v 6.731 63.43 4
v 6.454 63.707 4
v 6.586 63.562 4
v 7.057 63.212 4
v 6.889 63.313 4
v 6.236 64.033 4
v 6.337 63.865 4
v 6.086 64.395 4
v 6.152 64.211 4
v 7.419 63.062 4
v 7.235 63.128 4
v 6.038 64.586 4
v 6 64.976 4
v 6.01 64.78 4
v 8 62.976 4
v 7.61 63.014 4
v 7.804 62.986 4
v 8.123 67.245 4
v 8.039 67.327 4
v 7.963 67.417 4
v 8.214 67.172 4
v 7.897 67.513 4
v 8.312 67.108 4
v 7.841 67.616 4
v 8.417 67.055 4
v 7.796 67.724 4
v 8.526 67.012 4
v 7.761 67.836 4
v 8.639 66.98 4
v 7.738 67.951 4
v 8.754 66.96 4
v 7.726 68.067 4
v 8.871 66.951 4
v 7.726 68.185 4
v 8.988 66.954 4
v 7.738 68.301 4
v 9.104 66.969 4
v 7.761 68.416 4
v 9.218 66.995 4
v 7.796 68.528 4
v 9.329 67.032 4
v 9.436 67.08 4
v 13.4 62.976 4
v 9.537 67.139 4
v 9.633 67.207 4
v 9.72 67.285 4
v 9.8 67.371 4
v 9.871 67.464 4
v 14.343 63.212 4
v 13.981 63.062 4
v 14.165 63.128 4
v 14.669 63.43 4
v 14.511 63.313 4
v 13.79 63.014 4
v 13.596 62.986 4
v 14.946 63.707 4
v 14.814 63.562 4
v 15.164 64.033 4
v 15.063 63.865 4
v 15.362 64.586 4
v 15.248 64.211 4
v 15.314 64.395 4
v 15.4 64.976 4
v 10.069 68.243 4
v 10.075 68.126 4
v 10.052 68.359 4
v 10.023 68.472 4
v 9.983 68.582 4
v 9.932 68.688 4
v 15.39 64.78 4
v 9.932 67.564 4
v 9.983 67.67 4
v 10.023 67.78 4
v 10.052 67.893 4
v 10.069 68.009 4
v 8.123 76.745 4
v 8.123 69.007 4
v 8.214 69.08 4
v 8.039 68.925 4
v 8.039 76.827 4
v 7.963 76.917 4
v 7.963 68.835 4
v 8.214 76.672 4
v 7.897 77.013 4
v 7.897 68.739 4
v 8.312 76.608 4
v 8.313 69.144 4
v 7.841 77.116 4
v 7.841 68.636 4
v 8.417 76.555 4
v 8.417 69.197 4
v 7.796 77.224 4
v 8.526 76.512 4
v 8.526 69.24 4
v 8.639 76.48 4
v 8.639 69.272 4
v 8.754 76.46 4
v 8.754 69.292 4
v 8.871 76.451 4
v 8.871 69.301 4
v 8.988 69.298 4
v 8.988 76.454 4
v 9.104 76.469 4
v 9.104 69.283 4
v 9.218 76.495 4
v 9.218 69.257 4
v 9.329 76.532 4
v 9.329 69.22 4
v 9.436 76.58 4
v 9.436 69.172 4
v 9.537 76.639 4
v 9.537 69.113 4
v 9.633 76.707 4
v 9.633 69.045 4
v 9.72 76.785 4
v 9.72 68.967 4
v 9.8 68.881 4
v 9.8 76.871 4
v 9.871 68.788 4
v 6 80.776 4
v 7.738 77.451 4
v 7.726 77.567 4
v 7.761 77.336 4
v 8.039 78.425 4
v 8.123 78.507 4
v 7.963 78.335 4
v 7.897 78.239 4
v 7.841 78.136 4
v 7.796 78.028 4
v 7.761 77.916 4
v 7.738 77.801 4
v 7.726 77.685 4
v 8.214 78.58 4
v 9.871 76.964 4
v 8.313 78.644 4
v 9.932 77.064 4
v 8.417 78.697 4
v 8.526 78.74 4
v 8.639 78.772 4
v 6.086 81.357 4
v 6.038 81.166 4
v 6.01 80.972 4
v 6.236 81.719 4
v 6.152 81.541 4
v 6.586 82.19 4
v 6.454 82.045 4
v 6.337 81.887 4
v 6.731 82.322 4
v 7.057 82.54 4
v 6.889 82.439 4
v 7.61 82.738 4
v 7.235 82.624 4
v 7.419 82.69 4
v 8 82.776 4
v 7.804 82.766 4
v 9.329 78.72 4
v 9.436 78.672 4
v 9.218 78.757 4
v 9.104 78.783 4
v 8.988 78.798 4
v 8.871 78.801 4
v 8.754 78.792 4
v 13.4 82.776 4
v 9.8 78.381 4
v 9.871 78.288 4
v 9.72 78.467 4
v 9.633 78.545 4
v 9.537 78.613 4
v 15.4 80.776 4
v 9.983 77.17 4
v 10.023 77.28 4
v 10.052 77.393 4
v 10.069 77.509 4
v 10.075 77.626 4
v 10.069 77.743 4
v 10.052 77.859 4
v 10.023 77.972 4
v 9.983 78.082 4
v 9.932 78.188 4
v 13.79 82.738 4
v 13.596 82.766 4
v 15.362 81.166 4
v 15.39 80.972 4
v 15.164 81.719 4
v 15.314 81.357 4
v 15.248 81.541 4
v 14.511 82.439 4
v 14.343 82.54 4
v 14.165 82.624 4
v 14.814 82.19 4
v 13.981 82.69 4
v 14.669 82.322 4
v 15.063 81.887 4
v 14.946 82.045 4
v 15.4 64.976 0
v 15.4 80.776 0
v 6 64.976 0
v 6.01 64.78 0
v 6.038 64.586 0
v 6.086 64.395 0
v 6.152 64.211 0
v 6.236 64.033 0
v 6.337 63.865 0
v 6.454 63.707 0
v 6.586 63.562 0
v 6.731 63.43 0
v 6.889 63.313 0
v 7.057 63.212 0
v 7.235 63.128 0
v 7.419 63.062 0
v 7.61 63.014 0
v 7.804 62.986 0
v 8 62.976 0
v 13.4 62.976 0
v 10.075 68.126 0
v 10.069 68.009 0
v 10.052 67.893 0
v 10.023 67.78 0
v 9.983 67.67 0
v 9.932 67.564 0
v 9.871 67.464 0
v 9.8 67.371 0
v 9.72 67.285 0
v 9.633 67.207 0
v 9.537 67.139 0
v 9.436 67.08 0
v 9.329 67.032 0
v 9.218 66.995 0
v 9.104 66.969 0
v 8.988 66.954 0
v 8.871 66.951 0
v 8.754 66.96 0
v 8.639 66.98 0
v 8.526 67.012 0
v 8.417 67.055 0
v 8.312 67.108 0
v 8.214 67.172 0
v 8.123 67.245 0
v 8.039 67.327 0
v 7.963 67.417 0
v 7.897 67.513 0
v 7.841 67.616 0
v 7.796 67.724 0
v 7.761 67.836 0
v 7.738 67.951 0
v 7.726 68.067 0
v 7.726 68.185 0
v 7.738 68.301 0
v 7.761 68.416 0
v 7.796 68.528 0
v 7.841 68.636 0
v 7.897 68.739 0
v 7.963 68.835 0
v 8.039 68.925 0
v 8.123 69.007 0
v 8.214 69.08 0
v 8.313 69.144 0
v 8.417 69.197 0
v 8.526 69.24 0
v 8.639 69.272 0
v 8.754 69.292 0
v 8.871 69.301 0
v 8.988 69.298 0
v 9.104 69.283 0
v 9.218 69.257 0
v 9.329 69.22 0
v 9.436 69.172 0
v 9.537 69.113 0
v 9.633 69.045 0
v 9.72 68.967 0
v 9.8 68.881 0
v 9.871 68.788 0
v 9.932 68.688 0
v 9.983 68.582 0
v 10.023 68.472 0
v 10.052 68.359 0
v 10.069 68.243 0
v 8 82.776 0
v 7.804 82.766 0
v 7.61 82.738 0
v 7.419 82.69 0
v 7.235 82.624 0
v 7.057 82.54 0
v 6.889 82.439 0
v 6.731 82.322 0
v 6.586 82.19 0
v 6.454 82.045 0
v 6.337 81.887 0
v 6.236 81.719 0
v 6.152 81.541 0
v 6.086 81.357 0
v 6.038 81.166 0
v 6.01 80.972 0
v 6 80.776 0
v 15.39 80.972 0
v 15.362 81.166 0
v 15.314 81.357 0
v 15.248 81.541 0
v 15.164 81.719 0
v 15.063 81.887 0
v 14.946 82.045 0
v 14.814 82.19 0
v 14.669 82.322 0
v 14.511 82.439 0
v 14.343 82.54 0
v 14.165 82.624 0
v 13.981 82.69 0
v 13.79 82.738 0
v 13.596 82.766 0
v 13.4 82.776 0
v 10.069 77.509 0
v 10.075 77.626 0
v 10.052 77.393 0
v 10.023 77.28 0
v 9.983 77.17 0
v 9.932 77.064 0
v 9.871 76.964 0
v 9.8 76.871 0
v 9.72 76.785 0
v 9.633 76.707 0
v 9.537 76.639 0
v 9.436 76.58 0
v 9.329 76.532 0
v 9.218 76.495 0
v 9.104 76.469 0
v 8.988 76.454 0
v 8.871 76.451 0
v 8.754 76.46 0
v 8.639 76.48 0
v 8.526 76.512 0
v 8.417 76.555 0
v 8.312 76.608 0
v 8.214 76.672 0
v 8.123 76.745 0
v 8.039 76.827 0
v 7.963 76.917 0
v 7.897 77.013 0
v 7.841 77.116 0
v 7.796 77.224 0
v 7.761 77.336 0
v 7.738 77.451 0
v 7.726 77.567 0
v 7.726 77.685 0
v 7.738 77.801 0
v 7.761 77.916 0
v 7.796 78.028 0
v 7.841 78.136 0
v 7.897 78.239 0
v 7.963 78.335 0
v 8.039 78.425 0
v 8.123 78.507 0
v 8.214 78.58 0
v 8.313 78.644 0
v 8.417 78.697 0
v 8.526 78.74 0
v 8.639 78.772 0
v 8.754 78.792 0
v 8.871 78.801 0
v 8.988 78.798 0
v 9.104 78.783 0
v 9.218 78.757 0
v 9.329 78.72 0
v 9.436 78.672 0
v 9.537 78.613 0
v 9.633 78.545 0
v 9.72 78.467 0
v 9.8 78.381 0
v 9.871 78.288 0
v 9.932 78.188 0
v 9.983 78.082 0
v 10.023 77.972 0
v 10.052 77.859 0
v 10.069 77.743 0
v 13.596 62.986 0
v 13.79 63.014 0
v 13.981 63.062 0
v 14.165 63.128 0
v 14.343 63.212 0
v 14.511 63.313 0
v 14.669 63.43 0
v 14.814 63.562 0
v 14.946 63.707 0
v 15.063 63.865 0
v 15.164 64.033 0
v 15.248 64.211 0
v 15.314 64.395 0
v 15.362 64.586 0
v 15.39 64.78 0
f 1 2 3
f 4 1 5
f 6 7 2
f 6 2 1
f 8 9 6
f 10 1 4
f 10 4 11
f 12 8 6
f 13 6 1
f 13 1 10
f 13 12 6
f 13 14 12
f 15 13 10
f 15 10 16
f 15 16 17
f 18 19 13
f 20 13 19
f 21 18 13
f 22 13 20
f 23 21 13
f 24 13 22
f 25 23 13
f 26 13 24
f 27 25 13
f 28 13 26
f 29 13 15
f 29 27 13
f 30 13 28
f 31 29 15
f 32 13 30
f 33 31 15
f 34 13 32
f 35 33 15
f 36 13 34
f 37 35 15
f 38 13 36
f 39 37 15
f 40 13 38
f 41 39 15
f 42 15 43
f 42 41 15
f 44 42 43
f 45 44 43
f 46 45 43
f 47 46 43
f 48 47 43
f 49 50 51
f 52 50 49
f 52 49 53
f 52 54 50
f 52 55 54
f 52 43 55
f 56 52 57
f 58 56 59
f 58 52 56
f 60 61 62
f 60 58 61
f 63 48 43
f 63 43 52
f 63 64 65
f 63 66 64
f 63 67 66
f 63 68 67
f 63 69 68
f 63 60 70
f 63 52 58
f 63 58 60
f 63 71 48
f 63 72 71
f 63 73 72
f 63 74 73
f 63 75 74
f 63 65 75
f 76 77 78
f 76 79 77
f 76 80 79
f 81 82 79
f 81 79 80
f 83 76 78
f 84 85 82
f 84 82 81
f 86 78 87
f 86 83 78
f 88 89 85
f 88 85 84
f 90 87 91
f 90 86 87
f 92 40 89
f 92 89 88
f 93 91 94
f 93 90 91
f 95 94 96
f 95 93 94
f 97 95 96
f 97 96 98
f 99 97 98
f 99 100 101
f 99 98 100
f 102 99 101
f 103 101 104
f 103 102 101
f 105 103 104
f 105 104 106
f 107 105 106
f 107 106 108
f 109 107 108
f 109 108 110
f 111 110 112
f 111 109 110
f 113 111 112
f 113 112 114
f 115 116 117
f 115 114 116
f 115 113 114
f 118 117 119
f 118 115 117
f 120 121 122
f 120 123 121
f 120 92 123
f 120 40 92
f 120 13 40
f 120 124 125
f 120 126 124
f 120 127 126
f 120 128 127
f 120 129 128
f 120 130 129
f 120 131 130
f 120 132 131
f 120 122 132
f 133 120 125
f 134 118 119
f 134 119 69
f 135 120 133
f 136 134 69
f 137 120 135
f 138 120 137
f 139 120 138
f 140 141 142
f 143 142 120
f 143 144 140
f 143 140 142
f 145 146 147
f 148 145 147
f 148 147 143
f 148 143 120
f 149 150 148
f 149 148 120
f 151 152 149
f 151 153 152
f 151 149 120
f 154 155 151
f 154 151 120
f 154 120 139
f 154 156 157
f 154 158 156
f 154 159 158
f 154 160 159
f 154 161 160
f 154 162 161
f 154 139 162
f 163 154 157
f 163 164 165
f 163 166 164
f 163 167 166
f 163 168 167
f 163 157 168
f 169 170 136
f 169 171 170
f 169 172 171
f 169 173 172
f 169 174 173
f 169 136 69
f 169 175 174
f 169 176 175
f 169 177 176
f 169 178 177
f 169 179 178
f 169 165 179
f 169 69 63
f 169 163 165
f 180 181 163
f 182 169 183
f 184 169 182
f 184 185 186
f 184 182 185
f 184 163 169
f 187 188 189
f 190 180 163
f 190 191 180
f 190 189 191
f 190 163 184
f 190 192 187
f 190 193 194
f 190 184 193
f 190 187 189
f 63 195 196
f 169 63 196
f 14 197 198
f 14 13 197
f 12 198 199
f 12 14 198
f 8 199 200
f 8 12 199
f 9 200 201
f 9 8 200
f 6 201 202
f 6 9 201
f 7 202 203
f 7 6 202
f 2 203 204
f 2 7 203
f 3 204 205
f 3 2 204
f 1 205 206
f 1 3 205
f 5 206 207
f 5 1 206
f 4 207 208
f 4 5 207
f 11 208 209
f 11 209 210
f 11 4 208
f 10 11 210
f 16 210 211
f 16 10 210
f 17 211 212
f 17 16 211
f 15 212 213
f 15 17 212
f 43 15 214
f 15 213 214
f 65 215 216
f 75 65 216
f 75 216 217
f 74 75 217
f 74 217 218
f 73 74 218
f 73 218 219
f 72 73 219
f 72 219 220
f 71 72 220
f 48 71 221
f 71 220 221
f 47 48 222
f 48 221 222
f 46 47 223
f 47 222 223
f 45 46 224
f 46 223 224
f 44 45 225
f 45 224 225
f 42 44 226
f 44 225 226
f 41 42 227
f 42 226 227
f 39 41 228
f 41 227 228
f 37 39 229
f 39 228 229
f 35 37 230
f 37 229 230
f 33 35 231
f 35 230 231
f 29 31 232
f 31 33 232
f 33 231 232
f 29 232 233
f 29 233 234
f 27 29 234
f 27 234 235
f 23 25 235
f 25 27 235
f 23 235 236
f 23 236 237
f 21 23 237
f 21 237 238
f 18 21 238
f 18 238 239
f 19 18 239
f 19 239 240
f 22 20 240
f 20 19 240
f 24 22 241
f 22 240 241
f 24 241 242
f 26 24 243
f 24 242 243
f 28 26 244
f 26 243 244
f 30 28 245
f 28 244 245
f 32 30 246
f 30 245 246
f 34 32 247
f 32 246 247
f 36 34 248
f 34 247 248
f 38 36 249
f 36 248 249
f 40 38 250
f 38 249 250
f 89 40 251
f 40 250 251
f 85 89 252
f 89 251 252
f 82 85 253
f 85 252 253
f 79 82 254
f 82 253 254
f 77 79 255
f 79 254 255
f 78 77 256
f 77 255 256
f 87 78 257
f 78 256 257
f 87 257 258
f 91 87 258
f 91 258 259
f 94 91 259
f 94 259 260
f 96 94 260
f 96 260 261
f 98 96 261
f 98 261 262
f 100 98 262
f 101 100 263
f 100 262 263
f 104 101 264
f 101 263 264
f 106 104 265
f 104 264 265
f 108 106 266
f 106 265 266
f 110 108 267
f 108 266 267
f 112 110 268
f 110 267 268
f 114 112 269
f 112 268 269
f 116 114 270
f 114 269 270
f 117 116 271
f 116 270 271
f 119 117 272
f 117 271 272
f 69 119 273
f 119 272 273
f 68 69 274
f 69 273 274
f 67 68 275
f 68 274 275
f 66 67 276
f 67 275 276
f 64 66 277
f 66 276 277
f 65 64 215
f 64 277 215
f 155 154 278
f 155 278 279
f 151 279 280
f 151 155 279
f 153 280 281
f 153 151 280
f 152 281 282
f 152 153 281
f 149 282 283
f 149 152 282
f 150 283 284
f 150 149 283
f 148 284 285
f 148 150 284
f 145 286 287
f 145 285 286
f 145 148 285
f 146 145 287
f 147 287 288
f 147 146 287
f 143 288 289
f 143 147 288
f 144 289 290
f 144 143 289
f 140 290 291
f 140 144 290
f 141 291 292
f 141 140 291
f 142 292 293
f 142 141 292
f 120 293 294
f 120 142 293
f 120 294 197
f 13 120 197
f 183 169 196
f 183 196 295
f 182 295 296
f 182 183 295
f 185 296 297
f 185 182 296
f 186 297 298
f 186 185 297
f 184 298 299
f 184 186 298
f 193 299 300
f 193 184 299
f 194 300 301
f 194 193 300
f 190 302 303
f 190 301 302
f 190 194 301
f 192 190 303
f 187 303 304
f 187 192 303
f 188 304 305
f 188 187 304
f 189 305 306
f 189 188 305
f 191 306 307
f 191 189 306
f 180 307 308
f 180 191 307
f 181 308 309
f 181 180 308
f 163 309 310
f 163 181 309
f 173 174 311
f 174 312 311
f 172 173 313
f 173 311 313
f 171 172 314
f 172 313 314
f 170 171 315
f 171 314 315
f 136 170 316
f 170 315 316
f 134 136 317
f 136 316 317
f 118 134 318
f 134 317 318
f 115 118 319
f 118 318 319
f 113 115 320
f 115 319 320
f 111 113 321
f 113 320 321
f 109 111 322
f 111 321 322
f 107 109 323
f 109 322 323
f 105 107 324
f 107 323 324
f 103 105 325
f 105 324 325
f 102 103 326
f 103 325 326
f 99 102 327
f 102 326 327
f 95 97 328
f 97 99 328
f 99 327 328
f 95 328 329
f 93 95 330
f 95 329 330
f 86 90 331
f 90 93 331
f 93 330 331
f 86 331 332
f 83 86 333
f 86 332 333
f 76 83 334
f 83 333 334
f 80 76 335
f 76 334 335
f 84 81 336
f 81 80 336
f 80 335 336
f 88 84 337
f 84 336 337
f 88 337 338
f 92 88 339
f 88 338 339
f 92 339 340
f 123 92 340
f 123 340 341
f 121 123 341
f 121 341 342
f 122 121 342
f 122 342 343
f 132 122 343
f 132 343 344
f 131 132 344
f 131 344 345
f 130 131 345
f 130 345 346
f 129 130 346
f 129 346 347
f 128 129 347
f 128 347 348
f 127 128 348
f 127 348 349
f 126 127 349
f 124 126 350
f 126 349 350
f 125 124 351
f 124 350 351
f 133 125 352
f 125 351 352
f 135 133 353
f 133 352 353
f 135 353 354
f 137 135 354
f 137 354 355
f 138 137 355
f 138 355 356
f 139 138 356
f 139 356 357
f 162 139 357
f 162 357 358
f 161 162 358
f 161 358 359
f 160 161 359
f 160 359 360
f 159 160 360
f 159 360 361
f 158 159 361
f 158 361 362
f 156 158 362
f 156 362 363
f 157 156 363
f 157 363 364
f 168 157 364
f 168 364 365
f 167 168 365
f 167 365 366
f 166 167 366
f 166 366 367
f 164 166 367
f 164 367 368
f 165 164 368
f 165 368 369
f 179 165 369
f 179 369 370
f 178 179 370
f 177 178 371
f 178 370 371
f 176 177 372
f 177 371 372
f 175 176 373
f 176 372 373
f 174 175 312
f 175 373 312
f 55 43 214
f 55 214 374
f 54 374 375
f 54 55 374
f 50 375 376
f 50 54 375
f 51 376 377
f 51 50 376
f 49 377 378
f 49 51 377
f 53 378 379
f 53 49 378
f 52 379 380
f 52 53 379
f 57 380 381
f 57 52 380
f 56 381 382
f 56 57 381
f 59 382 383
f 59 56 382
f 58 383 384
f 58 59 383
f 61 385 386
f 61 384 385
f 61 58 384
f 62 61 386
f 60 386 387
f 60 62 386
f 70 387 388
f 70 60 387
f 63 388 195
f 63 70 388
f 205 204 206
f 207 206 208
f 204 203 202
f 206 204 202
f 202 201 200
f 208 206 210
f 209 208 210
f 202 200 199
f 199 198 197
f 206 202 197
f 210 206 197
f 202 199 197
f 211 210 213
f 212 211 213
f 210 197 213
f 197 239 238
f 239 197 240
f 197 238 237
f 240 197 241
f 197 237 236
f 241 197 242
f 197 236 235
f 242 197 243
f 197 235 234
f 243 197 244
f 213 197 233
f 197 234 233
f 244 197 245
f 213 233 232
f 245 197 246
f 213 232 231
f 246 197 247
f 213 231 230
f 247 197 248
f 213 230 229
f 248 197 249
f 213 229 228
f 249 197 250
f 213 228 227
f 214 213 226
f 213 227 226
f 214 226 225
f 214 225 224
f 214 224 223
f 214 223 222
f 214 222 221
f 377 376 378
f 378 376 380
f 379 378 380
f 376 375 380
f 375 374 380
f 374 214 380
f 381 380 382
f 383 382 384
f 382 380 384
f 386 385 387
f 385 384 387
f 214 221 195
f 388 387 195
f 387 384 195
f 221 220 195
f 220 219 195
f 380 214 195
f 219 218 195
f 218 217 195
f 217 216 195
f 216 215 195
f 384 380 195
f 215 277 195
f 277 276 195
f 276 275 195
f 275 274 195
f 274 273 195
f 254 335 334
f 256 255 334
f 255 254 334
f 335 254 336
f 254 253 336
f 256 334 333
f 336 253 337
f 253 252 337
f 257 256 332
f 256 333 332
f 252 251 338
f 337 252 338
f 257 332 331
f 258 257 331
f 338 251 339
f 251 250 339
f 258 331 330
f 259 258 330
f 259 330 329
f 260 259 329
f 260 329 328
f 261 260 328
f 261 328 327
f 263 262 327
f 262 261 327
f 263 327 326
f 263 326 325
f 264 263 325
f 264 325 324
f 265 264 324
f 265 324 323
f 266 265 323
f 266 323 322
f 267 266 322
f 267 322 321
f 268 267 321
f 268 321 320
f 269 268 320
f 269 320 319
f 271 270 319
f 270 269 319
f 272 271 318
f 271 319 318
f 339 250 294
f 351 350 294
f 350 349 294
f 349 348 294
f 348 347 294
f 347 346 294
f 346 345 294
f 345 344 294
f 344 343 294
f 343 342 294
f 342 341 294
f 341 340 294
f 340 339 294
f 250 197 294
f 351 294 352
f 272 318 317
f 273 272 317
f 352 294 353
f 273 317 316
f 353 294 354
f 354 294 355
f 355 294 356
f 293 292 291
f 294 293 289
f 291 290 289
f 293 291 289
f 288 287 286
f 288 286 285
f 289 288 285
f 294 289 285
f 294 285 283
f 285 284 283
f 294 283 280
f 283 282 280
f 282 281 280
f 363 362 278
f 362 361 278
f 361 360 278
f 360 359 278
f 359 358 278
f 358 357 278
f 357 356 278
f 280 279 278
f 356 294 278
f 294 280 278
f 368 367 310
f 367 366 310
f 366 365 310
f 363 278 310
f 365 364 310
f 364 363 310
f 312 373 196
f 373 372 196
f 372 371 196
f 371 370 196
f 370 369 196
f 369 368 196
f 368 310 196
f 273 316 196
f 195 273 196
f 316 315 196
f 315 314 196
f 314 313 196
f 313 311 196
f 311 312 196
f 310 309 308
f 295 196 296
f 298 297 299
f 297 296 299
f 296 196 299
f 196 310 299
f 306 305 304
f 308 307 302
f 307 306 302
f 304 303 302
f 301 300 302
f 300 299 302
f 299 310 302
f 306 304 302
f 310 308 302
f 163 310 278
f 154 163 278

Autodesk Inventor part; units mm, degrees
ref_plane "YZ Plane" through (0, 0, 0) normal (1, 0, 0) x (0, 1, 0)
ref_plane "XZ Plane" through (0, 0, 0) normal (0, 1, 0) x (-1, 0, 0)
ref_plane "XY Plane" through (0, 0, 0) normal (0, 0, 1) x (1, 0, 0)
sketch "Sketch1" plane through (0, 0, 0) normal (0, 0, 1) x (1, 0, 0)
  line L0 (-17.9772, -42.3695) -> (-21.9772, -42.3695) construction
  line L1 (-21.9772, -42.3695) -> (-21.9772, -36.3695) construction
  line L2 (-21.9772, -36.3695) -> (-17.9772, -36.3695) construction
  line L3 (-17.9772, -36.3695) -> (-17.9772, -42.3695) construction
  line L4 (52, -0.656) -> (44, -0.656) construction
  line L5 (44, -0.656) -> (44, 3.344) construction
  line L6 (44, 3.344) -> (52, 3.344) construction
  line L7 (52, 3.344) -> (52, -0.656) construction
  line L8 (-62, 48.621) -> (-62, 52.621) construction
  line L9 (-62, 52.621) -> (-54, 52.621) construction
  line L10 (-54, 52.621) -> (-54, 48.621) construction
  line L11 (-54, 48.621) -> (-62, 48.621) construction
  line L12 (-52, 7.344) -> (-52, 11.344) construction
  line L13 (-52, 11.344) -> (-44, 11.344) construction
  line L14 (-44, 11.344) -> (-44, 7.344) construction
  line L15 (-44, 7.344) -> (-52, 7.344) construction
  line L16 (62, 52.621) -> (62, 48.621) construction
  line L17 (62, 48.621) -> (54, 48.621) construction
  line L18 (54, 48.621) -> (54, 52.621) construction
  line L19 (54, 52.621) -> (62, 52.621) construction
  line L20 (44, 7.344) -> (44, 11.344) construction
  line L21 (44, 11.344) -> (52, 11.344) construction
  line L22 (52, 11.344) -> (52, 7.344) construction
  line L23 (52, 7.344) -> (44, 7.344) construction
  line L24 (-62, 56.621) -> (-62, 60.621) construction
  line L25 (-62, 60.621) -> (-54, 60.621) construction
  line L26 (-54, 60.621) -> (-54, 56.621) construction
  line L27 (-54, 56.621) -> (-62, 56.621) construction
  line L28 (-52, -0.656) -> (-52, 3.344) construction
  line L29 (-52, 3.344) -> (-44, 3.344) construction
  line L30 (-44, 3.344) -> (-44, -0.656) construction
  line L31 (-44, -0.656) -> (-52, -0.656) construction
  line L32 (62, 56.621) -> (54, 56.621) construction
  line L33 (54, 56.621) -> (54, 60.621) construction
  line L34 (54, 60.621) -> (62, 60.621) construction
  line L35 (62, 60.621) -> (62, 56.621) construction
  line L36 (95, 92.776) -> (95, 67.276) construction
  line L37 (-95, 92.776) -> (95, 92.776) construction
  line L38 (-95, 67.276) -> (-95, 92.776) construction
  spline S0 degree 4 poles (-93.2021, 32.276) (-94.3974, 41.3088) (-94.1998, 50.4639) (-95, 58.5765) (-95, 67.276) knots 0 0 0 0 0 1 1 1 1 1 construction
  spline S1 degree 3 poles (-93.2021, 32.276) (-92.477, 26.7964) (-92.3858, 18.3442) (-91.1679, 2.9086) (-90.2735, -4.0991) (-87.5297, -12.5723) (-86.3245, -15.3658) (-83.5784, -19.0417) (-82.333, -20.2665) (-79.6267, -21.887) (-78.3236, -22.3544) (-75.4283, -22.8138) (-73.9041, -22.7525) (-70.1581, -22.0875) (-67.9924, -21.2389) (-63.108, -18.9118) (-60.4378, -17.2966) (-54.8519, -14.6799) (-51.0186, -13.1408) (-44.4768, -12.6137) (-42.1843, -12.7653) (-38.5465, -13.8837) (-37.172, -14.5679) (-34.6876, -16.441) (-33.6448, -17.5823) (-32.7756, -18.8783) knots 0 0 0 0 1.658209 1.658209 2.939775 2.939775 3.538541 3.538541 3.905679 3.905679 4.202372 4.202372 4.52291 4.52291 5.00118 5.00118 5.654804 5.654804 6.203864 6.203864 6.490865 6.490865 6.688319 6.688319 6.886783 6.886783 6.886783 6.886783 construction
  spline S2 degree 4 poles (95, 67.276) (95, 55.7504) (92.5859, 37.7114) (100.8312, 0.406) (16.3507, -5.0368) (37.7982, -57.0134) (0, -92.776) (-31.6805, -62.8016) (-26.5791, -34.2881) (-31.0379, -21.8211) (-32.7756, -18.8783) knots 0 0 0 0 0 0.141322 0.242902 0.345989 0.449799 0.550201 0.654011 0.69056 0.69056 0.69056 0.69056 0.69056 construction
  line L39 (-40, 82.776) -> (-44, 82.776) construction
  line L40 (-40, 62.776) -> (-40, 82.776) construction
  line L41 (-44, 62.776) -> (-40, 62.776) construction
  line L42 (-44, 82.776) -> (-44, 62.776) construction
  line L43 (-40, 22.776) -> (-40, 42.776) construction
  line L44 (-44, 22.776) -> (-40, 22.776) construction
  line L45 (-44, 42.776) -> (-44, 22.776) construction
  line L46 (-40, 42.776) -> (-44, 42.776) construction
  line L47 (-10, 12.776) -> (-30, 12.776) construction
  line L48 (-10, 8.776) -> (-10, 12.776) construction
  line L49 (-30, 8.776) -> (-10, 8.776) construction
  line L50 (-30, 12.776) -> (-30, 8.776) construction
  line L51 (44, 82.776) -> (40, 82.776) construction
  line L52 (44, 62.776) -> (44, 82.776) construction
  line L53 (40, 62.776) -> (44, 62.776) construction
  line L54 (40, 82.776) -> (40, 62.776) construction
  line L55 (44, 22.776) -> (44, 42.776) construction
  line L56 (40, 22.776) -> (44, 22.776) construction
  line L57 (40, 42.776) -> (40, 22.776) construction
  line L58 (44, 42.776) -> (40, 42.776) construction
  line L59 (30, 12.776) -> (10, 12.776) construction
  line L60 (30, 8.776) -> (30, 12.776) construction
  line L61 (10, 8.776) -> (30, 8.776) construction
  line L62 (10, 12.776) -> (10, 8.776) construction
  circle A0 centre (-78.75, 27.8364) radius 1.5 construction
  circle A1 centre (-58.125, 15.9285) radius 1.5 construction
  circle A2 centre (-71.875, 15.9285) radius 1.5 construction
  circle A3 centre (-71.875, 39.7442) radius 1.5 construction
  circle A4 centre (-58.125, 39.7442) radius 1.5 construction
  circle A5 centre (-51.25, 27.8364) radius 1.5 construction
  circle A6 centre (-65, 27.8364) radius 10.5 construction
  circle A7 centre (-8.625, -30.663) radius 1.5 construction
  circle A8 centre (8.625, -30.663) radius 1.5 construction
  circle A9 centre (17.25, -15.724) radius 1.5 construction
  circle A10 centre (8.625, -0.7851) radius 1.5 construction
  circle A11 centre (-8.625, -0.7851) radius 1.5 construction
  circle A12 centre (-17.25, -15.724) radius 1.5 construction
  circle A13 centre (6.875, -45.3162) radius 1.5 construction
  circle A14 centre (13.75, -57.224) radius 1.5 construction
  circle A15 centre (0, -57.224) radius 10.5 construction
  circle A16 centre (-6.875, -69.1319) radius 1.5 construction
  circle A17 centre (6.875, -69.1319) radius 1.5 construction
  circle A18 centre (-6.875, -45.3162) radius 1.5 construction
  circle A19 centre (-13.75, -57.224) radius 1.5 construction
  circle A20 centre (58.125, 15.9285) radius 1.5 construction
  circle A21 centre (71.875, 15.9285) radius 1.5 construction
  circle A22 centre (78.75, 27.8364) radius 1.5 construction
  circle A23 centre (71.875, 39.7442) radius 1.5 construction
  circle A24 centre (58.125, 39.7442) radius 1.5 construction
  circle A25 centre (51.25, 27.8364) radius 1.5 construction
  circle A26 centre (0, -15.724) radius 14 construction
  circle A27 centre (65, 27.8364) radius 10.5 construction
  circle A28 centre (8.9, 77.626) radius 1.175
  circle A29 centre (8.9, 68.126) radius 1.175
  line L63 (6, 62.976) -> (15.4, 62.976)
  line L64 (15.4, 62.976) -> (15.4, 82.776)
  line L65 (15.4, 82.776) -> (6, 82.776)
  line L66 (6, 82.776) -> (6, 62.976)
  point P0 (0, 0)
  dimension "d0" = 24.6
  dimension "d1" = 2.35
  dimension "d2" = 9.5
  dimension "d3" = 19.8
  dimension "d4" = 9.4
  dimension "d5" = 5.15
  dimension "d6" = 2.9
  dimension "d7" = 10
extrude "Extrusion1" add sketch "Sketch1" along normal blind 4
fillet "Fillet1" radius 2 4 edges at (6, 62.976, 2) (15.4, 62.976, 2) (15.4, 82.776, 2) (6, 82.776, 2)
properties part number "Door_LimitSwitch_Offset" material "MDF Medium Density Fiberboard"
